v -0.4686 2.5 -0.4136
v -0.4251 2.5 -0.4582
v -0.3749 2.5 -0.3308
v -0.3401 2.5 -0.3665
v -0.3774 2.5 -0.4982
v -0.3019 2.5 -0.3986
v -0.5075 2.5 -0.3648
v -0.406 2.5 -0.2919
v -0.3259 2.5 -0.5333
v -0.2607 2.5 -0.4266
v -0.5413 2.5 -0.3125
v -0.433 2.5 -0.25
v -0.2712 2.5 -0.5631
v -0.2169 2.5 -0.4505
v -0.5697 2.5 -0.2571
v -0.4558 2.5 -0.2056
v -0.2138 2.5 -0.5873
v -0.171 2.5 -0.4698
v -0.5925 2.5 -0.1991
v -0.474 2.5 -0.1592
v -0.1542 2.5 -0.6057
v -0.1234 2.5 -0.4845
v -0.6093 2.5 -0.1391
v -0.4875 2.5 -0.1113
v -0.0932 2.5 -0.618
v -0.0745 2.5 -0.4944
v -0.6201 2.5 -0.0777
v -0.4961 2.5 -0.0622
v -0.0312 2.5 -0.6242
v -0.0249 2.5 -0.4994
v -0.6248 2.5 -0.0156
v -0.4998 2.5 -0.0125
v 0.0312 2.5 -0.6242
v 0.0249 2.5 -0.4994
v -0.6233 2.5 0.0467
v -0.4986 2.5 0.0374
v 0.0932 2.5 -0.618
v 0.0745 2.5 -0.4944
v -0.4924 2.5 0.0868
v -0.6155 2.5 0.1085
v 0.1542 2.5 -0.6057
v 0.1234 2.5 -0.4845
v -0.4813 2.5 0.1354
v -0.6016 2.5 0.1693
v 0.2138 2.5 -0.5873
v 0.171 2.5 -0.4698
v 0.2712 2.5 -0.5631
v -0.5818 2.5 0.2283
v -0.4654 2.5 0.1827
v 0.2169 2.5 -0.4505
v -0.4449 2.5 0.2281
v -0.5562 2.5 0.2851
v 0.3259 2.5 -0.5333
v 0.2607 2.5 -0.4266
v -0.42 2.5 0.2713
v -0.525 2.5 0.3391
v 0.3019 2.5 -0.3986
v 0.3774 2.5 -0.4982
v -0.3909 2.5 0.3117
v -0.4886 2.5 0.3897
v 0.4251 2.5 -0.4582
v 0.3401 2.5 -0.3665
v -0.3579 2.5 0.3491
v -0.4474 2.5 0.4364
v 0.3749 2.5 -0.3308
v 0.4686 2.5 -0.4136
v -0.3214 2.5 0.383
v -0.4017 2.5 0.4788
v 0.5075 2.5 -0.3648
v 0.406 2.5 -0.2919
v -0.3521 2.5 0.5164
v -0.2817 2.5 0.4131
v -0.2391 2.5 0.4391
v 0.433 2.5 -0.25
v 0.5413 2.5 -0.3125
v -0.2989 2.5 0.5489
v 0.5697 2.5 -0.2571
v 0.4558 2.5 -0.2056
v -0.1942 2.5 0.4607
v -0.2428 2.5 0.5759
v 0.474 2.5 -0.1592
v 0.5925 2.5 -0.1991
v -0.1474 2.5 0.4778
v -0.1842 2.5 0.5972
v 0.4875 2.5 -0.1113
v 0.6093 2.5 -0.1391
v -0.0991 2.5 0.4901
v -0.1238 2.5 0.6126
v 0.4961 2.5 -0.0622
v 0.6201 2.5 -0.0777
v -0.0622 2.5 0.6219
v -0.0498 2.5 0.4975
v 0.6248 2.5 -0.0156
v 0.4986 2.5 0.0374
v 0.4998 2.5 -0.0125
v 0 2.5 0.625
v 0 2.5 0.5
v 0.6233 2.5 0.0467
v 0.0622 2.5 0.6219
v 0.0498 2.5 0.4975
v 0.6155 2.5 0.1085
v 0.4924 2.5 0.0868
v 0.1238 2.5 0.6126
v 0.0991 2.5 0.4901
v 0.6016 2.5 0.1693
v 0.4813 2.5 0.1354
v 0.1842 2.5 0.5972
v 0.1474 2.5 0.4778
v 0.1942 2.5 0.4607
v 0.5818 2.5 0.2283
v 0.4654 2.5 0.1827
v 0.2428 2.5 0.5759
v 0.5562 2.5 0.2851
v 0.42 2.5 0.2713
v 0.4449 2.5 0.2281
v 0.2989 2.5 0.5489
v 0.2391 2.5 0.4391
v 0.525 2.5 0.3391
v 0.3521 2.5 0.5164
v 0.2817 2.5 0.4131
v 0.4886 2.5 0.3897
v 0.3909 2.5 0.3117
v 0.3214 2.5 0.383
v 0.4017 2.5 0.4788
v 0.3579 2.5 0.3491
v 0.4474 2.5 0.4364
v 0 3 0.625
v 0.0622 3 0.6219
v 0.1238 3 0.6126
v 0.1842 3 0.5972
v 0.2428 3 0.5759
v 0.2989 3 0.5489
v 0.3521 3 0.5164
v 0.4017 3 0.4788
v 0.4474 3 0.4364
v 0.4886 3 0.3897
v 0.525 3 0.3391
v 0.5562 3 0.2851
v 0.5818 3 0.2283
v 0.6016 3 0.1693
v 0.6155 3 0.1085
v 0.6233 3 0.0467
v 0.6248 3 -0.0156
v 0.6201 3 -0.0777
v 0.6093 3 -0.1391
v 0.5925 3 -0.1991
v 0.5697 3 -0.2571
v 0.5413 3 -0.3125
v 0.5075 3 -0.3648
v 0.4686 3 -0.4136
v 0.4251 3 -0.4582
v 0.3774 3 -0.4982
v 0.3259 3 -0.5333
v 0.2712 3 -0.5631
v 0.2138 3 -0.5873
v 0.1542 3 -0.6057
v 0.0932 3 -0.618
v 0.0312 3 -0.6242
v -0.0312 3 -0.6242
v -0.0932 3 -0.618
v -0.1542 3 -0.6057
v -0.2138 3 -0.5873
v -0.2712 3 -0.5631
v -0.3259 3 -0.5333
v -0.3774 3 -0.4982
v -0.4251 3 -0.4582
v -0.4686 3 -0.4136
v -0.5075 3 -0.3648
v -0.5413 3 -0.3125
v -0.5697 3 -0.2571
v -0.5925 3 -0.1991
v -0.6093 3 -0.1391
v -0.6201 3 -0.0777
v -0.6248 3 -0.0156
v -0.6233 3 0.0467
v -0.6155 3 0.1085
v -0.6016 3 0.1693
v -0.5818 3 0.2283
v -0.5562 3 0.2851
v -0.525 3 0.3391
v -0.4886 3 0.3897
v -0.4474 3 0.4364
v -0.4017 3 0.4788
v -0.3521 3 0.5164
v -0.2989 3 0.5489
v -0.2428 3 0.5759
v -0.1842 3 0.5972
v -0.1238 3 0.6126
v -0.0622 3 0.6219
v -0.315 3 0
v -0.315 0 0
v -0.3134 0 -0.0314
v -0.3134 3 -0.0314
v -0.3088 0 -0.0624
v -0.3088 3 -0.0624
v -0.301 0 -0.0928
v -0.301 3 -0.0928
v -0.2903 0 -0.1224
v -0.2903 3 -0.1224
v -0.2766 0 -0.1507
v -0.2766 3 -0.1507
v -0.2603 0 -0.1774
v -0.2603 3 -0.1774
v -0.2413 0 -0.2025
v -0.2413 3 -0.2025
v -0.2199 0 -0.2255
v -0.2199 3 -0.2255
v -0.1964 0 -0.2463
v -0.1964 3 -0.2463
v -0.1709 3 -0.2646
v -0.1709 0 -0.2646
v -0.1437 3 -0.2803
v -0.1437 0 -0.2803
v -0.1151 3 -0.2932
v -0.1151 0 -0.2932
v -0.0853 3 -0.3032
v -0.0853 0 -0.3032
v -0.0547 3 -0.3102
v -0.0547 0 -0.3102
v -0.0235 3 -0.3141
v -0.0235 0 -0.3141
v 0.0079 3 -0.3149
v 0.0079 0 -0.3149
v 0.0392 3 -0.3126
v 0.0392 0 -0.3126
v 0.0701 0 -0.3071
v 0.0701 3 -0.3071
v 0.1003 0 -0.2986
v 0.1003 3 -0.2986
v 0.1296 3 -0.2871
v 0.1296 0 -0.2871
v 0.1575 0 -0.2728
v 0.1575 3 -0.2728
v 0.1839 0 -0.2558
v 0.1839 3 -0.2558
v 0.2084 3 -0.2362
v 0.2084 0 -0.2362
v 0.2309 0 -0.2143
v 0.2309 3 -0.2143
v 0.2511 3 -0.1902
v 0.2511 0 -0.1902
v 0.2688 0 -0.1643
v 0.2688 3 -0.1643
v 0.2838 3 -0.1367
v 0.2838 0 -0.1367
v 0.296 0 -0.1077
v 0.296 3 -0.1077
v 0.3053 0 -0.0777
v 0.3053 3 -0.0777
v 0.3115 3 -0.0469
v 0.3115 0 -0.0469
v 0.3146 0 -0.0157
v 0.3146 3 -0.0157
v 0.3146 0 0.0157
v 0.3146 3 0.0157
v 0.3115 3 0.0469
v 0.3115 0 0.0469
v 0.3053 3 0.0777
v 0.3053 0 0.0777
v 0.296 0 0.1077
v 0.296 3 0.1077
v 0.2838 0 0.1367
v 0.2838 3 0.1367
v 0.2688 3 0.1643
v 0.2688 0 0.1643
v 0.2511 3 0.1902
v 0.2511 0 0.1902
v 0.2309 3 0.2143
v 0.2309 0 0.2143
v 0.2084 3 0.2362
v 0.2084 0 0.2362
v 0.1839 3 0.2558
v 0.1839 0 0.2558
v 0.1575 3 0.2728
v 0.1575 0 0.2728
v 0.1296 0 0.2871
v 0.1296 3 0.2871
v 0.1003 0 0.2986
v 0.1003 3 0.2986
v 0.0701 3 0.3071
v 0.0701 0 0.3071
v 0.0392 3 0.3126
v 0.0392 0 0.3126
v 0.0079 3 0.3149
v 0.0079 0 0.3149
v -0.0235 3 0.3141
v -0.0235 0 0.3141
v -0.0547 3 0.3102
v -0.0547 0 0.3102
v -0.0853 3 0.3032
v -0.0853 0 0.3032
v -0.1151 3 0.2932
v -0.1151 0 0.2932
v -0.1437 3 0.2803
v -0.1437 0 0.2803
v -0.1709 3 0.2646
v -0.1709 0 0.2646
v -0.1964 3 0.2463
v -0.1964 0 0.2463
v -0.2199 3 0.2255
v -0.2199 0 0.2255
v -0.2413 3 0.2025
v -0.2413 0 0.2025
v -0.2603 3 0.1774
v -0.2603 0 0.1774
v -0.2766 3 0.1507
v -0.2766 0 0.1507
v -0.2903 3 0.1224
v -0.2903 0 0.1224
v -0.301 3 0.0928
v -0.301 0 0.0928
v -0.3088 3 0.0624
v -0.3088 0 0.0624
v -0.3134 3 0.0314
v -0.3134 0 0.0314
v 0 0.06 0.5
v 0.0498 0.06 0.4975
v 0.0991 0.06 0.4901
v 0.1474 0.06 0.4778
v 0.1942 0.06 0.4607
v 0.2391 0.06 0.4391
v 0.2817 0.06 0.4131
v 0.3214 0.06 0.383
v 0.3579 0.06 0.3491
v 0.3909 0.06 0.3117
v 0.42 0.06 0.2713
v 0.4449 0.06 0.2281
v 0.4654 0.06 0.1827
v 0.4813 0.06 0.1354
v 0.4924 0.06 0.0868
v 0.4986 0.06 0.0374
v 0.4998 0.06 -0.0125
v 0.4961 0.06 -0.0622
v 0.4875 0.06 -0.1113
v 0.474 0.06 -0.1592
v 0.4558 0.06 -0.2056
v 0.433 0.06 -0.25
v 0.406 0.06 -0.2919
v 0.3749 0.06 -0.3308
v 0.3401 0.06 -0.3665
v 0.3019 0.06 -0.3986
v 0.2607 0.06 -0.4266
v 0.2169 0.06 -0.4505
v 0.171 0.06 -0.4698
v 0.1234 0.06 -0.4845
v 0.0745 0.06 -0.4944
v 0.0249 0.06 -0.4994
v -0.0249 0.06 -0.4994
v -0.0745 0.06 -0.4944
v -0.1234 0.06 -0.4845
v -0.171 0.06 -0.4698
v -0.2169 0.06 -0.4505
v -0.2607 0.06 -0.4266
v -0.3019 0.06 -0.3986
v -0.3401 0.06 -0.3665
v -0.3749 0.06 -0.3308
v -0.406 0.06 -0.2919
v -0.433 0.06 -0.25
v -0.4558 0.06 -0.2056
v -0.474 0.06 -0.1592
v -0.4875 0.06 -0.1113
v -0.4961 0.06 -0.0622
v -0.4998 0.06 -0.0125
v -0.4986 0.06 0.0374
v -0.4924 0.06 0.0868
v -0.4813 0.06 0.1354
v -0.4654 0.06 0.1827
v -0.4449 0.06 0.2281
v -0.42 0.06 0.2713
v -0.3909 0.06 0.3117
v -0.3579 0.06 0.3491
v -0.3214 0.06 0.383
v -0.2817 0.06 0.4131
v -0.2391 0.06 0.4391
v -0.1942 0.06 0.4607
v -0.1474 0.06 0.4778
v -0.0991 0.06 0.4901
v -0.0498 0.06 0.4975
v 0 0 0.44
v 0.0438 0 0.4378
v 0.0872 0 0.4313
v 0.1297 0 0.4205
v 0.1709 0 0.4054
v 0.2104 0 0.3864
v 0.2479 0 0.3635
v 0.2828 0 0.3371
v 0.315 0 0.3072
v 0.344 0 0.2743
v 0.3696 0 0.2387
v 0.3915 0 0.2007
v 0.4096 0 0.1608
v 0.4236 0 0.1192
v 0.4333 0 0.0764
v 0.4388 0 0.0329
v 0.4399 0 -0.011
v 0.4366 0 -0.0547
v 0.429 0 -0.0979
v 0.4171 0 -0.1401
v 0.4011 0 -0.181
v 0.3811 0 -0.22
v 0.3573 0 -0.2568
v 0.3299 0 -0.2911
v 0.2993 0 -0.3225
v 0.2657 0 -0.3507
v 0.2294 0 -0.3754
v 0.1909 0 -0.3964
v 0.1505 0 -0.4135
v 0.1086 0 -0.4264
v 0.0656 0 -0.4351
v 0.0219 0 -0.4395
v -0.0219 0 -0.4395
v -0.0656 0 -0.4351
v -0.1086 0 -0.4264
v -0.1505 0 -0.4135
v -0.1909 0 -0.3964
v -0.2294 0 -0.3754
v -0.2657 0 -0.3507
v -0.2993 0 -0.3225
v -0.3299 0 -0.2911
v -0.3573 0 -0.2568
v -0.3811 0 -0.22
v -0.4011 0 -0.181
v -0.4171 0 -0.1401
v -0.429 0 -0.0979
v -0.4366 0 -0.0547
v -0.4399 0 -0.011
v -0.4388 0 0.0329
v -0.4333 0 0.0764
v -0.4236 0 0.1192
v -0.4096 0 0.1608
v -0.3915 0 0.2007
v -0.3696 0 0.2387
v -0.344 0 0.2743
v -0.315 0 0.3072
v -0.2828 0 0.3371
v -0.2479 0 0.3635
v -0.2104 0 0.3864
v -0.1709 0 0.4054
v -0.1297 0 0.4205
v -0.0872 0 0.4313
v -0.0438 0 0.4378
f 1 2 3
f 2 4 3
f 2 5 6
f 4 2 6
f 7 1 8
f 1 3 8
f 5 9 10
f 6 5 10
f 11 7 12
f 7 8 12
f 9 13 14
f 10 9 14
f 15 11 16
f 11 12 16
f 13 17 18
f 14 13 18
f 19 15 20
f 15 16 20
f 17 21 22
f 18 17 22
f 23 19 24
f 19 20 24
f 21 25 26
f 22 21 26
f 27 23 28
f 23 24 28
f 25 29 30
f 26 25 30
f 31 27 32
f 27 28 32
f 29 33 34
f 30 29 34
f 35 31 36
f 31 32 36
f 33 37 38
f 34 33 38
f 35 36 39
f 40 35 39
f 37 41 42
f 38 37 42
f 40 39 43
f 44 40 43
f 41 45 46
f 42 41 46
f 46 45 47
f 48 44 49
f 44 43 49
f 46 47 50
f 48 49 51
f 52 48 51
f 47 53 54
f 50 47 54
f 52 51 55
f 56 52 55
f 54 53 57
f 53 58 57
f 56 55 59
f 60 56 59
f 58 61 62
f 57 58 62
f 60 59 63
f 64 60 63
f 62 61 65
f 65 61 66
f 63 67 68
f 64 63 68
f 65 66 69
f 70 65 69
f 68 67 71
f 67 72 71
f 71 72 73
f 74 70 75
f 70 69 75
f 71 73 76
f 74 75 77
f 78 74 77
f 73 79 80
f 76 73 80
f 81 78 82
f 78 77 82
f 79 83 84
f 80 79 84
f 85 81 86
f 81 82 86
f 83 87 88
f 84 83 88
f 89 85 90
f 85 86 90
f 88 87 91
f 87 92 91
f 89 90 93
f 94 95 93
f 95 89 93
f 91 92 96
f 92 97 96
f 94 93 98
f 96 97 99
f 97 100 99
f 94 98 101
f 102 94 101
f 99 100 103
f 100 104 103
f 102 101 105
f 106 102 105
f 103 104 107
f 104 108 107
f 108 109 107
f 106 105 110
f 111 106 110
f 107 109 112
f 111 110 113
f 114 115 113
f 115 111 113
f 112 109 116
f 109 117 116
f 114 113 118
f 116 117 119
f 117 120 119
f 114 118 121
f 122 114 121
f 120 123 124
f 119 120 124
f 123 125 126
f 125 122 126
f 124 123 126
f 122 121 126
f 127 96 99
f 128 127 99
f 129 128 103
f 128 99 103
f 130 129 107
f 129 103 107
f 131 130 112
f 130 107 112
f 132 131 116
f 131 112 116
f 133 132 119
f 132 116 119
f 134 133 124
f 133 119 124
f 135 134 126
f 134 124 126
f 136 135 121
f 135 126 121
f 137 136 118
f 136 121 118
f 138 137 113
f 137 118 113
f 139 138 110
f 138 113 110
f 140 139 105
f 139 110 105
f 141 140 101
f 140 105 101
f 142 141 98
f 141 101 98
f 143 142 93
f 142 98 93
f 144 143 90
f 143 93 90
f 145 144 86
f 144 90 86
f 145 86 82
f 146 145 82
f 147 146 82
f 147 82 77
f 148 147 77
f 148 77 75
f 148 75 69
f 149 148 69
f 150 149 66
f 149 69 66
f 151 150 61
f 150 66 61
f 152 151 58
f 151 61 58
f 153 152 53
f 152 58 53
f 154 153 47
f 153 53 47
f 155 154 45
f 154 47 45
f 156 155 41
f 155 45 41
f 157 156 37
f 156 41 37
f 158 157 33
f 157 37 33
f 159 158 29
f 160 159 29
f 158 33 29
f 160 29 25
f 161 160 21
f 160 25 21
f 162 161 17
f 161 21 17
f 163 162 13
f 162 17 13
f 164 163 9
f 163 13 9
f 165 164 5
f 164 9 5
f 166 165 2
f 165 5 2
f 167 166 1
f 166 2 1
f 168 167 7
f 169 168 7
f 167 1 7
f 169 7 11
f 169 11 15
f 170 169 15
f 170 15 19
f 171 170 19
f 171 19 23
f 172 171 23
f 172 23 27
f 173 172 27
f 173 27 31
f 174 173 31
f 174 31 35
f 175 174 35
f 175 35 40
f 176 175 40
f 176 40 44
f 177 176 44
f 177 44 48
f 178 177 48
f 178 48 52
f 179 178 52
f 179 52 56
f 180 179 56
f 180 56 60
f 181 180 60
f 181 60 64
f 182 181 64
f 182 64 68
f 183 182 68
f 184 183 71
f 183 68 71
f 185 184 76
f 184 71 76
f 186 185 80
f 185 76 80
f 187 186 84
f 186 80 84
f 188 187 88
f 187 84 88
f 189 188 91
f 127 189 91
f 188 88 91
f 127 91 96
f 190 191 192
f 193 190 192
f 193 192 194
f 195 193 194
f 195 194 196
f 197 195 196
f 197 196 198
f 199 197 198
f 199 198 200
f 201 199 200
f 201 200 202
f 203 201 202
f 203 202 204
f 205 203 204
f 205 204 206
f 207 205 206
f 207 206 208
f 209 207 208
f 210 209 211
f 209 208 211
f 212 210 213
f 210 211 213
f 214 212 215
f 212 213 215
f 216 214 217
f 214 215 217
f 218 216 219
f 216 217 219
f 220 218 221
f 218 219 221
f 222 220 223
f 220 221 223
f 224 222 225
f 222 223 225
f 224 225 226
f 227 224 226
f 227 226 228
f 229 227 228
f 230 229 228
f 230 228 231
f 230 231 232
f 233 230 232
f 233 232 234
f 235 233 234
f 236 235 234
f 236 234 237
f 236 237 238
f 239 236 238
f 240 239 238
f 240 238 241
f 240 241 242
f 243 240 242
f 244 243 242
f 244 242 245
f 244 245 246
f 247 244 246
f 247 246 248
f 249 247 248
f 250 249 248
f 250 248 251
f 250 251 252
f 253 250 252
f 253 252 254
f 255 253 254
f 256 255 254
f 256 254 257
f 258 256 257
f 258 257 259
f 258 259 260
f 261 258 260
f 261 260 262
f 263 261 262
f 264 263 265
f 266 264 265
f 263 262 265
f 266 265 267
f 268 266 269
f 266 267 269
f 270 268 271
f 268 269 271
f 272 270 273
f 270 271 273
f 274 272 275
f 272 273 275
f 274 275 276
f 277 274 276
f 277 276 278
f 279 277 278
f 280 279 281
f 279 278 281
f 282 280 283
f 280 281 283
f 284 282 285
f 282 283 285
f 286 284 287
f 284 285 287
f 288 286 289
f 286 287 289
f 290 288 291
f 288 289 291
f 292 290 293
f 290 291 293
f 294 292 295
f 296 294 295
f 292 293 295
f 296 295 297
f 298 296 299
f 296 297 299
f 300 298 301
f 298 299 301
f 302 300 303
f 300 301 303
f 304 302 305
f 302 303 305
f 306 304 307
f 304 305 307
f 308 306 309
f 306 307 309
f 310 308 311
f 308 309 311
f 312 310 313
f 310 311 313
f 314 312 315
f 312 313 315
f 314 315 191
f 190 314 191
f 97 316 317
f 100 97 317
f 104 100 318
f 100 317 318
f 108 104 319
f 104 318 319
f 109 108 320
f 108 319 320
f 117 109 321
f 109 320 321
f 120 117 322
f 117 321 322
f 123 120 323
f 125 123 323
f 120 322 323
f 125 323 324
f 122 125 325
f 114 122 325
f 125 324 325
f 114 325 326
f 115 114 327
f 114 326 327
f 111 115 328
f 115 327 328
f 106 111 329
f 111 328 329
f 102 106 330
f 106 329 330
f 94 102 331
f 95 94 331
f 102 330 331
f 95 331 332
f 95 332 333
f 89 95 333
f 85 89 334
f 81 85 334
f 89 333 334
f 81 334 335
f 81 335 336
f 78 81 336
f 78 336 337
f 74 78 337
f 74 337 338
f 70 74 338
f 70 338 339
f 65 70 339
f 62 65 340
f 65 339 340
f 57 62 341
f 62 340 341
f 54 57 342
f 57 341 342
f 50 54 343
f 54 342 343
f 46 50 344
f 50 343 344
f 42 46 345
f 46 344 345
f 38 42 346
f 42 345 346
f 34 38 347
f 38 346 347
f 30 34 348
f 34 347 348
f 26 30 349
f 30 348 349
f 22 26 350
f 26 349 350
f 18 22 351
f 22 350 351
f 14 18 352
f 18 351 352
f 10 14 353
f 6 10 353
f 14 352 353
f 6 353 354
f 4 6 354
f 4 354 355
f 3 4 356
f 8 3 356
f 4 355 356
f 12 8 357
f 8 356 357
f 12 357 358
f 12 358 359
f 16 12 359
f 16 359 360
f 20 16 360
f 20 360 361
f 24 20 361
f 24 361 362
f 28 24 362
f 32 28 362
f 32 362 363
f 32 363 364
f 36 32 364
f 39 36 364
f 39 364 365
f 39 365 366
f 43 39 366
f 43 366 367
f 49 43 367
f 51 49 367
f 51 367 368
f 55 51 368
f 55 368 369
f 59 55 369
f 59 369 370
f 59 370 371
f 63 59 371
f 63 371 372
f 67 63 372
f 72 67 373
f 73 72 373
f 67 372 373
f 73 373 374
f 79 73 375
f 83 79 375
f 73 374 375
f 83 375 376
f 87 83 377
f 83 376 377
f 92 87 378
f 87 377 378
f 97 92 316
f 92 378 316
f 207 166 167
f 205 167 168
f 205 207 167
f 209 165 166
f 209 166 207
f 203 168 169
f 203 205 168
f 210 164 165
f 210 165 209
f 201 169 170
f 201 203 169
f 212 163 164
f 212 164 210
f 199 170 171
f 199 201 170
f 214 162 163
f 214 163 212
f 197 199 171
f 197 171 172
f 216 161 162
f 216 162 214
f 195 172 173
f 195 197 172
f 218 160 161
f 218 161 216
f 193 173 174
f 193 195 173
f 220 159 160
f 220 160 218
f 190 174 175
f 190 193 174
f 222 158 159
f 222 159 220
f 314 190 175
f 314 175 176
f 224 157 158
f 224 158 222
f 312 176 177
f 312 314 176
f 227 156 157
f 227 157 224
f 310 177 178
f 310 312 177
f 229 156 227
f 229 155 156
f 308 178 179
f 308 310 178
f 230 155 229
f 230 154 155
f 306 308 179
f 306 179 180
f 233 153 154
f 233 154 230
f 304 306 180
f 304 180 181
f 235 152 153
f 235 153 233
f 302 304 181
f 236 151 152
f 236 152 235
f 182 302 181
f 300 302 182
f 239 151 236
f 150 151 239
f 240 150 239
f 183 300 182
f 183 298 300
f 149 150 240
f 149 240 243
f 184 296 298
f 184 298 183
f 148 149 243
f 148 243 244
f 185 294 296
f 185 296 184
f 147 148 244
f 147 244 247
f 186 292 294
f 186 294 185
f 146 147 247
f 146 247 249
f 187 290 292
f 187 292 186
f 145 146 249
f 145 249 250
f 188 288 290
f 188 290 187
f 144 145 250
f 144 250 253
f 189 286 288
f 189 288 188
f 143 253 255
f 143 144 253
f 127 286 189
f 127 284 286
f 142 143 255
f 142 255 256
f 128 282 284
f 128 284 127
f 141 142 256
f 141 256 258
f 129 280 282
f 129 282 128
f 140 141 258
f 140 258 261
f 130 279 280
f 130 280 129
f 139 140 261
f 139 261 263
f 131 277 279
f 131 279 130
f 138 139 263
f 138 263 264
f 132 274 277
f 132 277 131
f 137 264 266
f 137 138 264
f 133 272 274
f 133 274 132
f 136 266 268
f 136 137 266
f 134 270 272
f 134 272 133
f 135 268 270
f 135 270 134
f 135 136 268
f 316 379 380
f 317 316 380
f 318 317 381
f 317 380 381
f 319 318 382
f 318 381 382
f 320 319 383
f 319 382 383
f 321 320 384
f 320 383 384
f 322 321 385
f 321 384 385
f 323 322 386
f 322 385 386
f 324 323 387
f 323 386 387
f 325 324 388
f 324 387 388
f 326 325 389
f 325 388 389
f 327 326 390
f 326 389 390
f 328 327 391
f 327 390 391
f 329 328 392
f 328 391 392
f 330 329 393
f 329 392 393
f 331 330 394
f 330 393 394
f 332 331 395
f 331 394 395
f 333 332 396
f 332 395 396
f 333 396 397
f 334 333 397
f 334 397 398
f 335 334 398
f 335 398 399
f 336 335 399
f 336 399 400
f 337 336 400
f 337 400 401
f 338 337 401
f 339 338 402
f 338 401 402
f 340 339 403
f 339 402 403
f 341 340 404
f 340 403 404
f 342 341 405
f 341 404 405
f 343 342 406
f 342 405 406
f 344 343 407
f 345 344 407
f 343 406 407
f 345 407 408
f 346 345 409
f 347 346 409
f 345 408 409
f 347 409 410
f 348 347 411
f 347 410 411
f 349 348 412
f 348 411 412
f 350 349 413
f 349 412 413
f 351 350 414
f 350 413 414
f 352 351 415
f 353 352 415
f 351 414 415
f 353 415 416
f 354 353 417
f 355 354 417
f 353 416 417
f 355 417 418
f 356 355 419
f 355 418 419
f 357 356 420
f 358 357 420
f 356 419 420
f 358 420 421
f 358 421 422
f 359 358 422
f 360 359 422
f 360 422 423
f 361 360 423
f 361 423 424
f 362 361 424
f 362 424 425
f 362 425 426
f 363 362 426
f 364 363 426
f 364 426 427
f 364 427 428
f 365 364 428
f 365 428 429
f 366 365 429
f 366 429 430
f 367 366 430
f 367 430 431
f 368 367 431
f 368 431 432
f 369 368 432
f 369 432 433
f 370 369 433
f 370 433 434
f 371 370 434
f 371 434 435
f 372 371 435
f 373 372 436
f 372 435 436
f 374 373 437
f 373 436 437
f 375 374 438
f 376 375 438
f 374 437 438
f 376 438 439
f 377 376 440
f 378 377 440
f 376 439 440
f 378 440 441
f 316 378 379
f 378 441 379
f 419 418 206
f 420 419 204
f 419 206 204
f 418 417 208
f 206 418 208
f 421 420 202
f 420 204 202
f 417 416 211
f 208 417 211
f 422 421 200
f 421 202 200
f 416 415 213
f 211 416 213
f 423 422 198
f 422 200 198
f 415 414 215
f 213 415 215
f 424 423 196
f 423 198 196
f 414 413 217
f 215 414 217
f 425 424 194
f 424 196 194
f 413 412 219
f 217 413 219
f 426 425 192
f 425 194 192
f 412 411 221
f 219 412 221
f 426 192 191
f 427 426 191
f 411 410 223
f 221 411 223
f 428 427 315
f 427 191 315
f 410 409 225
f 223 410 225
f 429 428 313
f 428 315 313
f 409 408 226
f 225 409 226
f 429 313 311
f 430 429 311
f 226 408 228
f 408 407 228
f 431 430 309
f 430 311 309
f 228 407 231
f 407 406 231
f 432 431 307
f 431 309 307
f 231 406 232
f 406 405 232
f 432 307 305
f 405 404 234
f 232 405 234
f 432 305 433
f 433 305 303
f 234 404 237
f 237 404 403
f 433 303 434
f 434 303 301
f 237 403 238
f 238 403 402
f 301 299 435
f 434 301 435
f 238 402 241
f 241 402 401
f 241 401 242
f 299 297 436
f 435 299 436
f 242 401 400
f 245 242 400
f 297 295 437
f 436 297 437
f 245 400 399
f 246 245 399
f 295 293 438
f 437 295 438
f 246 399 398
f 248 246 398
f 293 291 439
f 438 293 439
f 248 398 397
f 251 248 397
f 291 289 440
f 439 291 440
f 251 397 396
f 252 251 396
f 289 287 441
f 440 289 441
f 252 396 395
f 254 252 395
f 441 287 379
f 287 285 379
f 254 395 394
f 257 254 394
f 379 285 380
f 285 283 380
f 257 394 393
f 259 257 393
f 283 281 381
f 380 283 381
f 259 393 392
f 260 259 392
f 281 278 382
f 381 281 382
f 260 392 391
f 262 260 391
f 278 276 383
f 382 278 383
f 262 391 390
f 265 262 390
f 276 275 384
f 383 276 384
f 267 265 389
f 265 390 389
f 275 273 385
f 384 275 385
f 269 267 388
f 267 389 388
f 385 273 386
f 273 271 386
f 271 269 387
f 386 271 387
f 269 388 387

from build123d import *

# Parameters (mm, degrees)
SKETCH1_R              = 0.5
BOSS_EXTRUDE1_DEPTH    = 2.5
SKETCH2_R              = 0.625
BOSS_EXTRUDE2_DEPTH    = 0.5
F_12_0MM_DOWEL_HOLE1_D = 0.63
CHAMFER1_SIZE          = 0.06


with BuildPart() as part:
    # Sketch1 → Boss-Extrude1 (new body)
    with BuildSketch(Plane(origin=(0, 0, 0), x_dir=(1, 0, 0), z_dir=(0, 1, 0))):
        with Locations(Location((0, 0, 0), (0, 0, 270))):
            Circle(SKETCH1_R)
    extrude(amount=BOSS_EXTRUDE1_DEPTH)

    # Sketch2 → Boss-Extrude2 (add)
    with BuildSketch(Plane(origin=(0, 2.5, 0), x_dir=(1, 0, 0), z_dir=(0, 1, 0))):
        with Locations(Location((0, 0, 0), (0, 0, 270))):
            Circle(SKETCH2_R)
    extrude(amount=BOSS_EXTRUDE2_DEPTH)

    # Ø12.0mm Dowel Hole1 (through all)
    with Locations(Plane(origin=(0, 3, 0), x_dir=(1, 0, 0), z_dir=(0, 1, 0))):
        with Locations((0, 0)):
            Hole(F_12_0MM_DOWEL_HOLE1_D / 2)

    # Chamfer1
    chamfer1_edges = [part.edges().sort_by_distance(p)[0] for p in [
        (0, 0, -0.5),
    ]]
    chamfer(chamfer1_edges, length=CHAMFER1_SIZE)


solid = part.part
